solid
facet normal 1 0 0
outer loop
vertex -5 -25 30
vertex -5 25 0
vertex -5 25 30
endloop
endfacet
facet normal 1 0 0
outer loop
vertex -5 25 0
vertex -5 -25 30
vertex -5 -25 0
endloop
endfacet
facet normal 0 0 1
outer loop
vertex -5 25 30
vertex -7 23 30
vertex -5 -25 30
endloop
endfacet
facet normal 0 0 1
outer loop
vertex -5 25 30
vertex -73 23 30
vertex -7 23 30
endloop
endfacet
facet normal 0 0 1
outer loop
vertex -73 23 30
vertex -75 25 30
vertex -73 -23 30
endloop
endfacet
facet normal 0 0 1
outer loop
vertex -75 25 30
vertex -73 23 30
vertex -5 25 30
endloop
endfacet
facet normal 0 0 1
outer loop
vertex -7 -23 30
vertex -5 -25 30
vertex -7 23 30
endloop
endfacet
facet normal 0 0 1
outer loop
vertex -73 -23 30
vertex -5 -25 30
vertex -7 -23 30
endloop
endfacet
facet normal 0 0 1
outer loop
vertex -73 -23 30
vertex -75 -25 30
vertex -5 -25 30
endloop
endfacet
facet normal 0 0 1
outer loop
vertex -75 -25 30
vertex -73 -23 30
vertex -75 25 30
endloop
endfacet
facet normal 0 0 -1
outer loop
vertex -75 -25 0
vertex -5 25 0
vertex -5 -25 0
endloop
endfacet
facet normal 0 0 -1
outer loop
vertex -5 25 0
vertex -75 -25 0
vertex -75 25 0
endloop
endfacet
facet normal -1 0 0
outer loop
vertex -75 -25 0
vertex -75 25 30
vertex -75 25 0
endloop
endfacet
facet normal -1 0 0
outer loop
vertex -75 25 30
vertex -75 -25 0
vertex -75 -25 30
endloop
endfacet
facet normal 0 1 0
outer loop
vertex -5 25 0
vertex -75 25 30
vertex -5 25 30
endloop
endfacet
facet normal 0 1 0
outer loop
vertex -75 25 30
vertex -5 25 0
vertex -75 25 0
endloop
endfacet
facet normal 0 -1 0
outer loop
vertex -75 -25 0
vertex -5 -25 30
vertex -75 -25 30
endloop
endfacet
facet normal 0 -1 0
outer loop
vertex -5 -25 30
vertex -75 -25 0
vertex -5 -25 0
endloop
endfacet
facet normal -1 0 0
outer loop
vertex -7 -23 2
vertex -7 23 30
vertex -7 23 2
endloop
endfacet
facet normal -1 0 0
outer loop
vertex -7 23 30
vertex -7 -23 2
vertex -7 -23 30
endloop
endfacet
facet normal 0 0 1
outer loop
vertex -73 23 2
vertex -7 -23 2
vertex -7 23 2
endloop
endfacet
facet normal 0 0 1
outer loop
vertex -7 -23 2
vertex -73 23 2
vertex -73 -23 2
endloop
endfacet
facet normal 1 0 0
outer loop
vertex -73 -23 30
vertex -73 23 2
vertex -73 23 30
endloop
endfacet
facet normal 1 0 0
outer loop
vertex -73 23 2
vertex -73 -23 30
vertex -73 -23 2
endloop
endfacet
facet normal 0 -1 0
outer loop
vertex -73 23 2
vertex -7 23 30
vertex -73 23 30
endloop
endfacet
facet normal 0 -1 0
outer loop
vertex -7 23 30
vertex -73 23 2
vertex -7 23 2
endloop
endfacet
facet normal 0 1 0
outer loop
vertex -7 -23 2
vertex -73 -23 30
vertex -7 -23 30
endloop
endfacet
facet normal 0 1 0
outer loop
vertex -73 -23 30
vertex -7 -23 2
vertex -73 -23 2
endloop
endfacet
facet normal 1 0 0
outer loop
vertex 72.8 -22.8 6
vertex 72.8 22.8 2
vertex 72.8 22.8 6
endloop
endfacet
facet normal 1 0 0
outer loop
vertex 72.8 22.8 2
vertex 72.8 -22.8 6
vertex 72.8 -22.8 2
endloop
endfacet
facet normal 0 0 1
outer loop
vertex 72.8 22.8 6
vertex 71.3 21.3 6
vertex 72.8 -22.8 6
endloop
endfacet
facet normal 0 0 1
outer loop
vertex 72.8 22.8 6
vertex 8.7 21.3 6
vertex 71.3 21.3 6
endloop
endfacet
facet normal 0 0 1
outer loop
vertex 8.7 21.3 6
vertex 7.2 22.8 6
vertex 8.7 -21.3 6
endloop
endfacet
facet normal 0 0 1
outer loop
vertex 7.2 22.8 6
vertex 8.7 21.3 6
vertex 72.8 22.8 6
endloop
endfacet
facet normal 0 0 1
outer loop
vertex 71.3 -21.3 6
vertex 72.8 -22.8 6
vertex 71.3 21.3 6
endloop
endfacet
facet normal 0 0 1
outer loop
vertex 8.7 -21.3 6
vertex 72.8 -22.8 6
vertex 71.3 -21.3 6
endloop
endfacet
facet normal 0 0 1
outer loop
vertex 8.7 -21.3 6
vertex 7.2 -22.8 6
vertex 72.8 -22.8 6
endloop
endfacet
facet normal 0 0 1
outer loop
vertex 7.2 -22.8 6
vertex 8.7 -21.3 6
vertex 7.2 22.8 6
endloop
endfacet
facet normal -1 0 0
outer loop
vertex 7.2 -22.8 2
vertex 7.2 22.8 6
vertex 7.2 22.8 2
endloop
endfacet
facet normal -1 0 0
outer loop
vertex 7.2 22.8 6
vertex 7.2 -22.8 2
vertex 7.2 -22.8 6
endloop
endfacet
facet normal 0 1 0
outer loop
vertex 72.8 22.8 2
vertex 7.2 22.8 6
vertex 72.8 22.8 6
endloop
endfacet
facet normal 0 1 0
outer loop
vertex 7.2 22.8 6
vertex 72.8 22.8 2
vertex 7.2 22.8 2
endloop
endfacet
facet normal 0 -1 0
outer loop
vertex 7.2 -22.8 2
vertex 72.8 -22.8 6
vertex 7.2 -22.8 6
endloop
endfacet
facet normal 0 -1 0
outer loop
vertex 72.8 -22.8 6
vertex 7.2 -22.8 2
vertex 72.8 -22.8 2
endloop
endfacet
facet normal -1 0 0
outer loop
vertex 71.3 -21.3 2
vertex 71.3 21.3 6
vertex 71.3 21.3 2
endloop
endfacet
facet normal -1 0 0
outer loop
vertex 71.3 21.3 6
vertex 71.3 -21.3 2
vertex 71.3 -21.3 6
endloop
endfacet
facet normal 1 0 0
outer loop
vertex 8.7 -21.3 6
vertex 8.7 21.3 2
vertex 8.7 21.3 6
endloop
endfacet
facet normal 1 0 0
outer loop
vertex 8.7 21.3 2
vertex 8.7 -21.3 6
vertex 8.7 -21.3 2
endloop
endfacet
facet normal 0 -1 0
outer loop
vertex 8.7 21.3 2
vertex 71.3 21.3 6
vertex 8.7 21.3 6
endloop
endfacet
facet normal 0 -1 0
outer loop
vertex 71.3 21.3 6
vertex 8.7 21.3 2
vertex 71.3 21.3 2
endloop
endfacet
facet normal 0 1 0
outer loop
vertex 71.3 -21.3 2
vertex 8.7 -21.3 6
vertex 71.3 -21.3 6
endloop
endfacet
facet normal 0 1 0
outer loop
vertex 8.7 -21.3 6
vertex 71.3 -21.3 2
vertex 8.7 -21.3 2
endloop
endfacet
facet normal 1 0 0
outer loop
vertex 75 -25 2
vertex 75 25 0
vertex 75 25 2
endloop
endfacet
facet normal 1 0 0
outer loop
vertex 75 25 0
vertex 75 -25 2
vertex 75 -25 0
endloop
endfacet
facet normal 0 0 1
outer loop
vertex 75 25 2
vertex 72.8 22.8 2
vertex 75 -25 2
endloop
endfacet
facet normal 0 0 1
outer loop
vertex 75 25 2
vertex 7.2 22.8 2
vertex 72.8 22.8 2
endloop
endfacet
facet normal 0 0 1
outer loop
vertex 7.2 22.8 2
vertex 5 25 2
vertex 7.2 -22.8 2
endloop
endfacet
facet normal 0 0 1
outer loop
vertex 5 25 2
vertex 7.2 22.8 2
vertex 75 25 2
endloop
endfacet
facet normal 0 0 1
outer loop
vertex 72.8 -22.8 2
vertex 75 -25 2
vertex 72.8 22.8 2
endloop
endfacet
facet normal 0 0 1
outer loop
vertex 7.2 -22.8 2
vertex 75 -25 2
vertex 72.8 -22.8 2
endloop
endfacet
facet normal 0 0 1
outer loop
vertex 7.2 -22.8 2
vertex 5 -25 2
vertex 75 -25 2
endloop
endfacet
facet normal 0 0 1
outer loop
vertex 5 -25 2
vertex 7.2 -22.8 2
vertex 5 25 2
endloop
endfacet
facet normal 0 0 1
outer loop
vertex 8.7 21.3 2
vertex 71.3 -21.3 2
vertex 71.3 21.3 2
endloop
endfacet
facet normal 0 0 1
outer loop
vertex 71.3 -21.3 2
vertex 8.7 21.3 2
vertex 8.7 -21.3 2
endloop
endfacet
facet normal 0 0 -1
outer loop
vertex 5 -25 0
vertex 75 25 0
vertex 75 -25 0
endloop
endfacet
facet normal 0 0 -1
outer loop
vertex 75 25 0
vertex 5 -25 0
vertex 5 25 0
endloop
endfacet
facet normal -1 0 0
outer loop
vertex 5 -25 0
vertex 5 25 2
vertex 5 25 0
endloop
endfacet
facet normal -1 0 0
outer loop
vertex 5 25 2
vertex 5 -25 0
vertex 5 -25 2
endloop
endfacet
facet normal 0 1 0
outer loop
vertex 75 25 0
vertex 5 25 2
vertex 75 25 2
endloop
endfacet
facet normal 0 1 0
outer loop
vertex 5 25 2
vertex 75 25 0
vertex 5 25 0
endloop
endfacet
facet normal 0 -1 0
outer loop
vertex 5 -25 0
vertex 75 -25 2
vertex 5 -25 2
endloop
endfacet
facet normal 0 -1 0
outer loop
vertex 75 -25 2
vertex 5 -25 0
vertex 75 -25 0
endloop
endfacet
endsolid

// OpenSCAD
// Two-part enclosure: open-top box + upside-down lid, printed side by side
// Units: mm

$fn = 64;

// ---------- Box ----------
box_x     = 70;    // box outer length (X)
box_y     = 50;    // box outer width (Y)
box_z     = 30;    // box outer height (Z)
wall      = 2;     // box wall thickness
floor_t   = 2;     // box floor thickness

// ---------- Lid ----------
lid_x     = 70;    // lid plate length (X)
lid_y     = 50;    // lid plate width (Y)
lid_t     = 2;     // lid plate thickness
lip_x     = 65.6;  // lip outer length (X)
lip_y     = 45.6;  // lip outer width (Y)
lip_wall  = 1.5;   // lip wall thickness
lip_h     = 4;     // lip height above plate

// ---------- Layout ----------
gap       = 10;    // gap between parts on the bed
eps       = 0.5;   // cutter overshoot past faces

// Centre the whole pair on the origin in X
total_x   = box_x + gap + lid_x;
box_cx    = -total_x/2 + box_x/2;          // box centre X
lid_cx    =  total_x/2 - lid_x/2;          // lid centre X (+X side)

// ---------- Part 1: Box ----------
module box() {
    difference() {
        translate([-box_x/2, -box_y/2, 0])
            cube([box_x, box_y, box_z]);
        // inner cavity, open top
        translate([-(box_x - 2*wall)/2, -(box_y - 2*wall)/2, floor_t])
            cube([box_x - 2*wall, box_y - 2*wall, box_z - floor_t + eps]);
    }
}

// ---------- Part 2: Lid (printed upside down) ----------
module lid() {
    union() {
        // plate on the bed
        translate([-lid_x/2, -lid_y/2, 0])
            cube([lid_x, lid_y, lid_t]);
        // rectangular lip on top of plate
        difference() {
            translate([-lip_x/2, -lip_y/2, lid_t - 0.01])
                cube([lip_x, lip_y, lip_h + 0.01]);
            translate([-(lip_x - 2*lip_wall)/2, -(lip_y - 2*lip_wall)/2, lid_t - eps])
                cube([lip_x - 2*lip_wall, lip_y - 2*lip_wall, lip_h + 2*eps]);
        }
    }
}

// ---------- Assembly on the bed ----------
translate([box_cx, 0, 0]) box();
translate([lid_cx, 0, 0]) lid();
